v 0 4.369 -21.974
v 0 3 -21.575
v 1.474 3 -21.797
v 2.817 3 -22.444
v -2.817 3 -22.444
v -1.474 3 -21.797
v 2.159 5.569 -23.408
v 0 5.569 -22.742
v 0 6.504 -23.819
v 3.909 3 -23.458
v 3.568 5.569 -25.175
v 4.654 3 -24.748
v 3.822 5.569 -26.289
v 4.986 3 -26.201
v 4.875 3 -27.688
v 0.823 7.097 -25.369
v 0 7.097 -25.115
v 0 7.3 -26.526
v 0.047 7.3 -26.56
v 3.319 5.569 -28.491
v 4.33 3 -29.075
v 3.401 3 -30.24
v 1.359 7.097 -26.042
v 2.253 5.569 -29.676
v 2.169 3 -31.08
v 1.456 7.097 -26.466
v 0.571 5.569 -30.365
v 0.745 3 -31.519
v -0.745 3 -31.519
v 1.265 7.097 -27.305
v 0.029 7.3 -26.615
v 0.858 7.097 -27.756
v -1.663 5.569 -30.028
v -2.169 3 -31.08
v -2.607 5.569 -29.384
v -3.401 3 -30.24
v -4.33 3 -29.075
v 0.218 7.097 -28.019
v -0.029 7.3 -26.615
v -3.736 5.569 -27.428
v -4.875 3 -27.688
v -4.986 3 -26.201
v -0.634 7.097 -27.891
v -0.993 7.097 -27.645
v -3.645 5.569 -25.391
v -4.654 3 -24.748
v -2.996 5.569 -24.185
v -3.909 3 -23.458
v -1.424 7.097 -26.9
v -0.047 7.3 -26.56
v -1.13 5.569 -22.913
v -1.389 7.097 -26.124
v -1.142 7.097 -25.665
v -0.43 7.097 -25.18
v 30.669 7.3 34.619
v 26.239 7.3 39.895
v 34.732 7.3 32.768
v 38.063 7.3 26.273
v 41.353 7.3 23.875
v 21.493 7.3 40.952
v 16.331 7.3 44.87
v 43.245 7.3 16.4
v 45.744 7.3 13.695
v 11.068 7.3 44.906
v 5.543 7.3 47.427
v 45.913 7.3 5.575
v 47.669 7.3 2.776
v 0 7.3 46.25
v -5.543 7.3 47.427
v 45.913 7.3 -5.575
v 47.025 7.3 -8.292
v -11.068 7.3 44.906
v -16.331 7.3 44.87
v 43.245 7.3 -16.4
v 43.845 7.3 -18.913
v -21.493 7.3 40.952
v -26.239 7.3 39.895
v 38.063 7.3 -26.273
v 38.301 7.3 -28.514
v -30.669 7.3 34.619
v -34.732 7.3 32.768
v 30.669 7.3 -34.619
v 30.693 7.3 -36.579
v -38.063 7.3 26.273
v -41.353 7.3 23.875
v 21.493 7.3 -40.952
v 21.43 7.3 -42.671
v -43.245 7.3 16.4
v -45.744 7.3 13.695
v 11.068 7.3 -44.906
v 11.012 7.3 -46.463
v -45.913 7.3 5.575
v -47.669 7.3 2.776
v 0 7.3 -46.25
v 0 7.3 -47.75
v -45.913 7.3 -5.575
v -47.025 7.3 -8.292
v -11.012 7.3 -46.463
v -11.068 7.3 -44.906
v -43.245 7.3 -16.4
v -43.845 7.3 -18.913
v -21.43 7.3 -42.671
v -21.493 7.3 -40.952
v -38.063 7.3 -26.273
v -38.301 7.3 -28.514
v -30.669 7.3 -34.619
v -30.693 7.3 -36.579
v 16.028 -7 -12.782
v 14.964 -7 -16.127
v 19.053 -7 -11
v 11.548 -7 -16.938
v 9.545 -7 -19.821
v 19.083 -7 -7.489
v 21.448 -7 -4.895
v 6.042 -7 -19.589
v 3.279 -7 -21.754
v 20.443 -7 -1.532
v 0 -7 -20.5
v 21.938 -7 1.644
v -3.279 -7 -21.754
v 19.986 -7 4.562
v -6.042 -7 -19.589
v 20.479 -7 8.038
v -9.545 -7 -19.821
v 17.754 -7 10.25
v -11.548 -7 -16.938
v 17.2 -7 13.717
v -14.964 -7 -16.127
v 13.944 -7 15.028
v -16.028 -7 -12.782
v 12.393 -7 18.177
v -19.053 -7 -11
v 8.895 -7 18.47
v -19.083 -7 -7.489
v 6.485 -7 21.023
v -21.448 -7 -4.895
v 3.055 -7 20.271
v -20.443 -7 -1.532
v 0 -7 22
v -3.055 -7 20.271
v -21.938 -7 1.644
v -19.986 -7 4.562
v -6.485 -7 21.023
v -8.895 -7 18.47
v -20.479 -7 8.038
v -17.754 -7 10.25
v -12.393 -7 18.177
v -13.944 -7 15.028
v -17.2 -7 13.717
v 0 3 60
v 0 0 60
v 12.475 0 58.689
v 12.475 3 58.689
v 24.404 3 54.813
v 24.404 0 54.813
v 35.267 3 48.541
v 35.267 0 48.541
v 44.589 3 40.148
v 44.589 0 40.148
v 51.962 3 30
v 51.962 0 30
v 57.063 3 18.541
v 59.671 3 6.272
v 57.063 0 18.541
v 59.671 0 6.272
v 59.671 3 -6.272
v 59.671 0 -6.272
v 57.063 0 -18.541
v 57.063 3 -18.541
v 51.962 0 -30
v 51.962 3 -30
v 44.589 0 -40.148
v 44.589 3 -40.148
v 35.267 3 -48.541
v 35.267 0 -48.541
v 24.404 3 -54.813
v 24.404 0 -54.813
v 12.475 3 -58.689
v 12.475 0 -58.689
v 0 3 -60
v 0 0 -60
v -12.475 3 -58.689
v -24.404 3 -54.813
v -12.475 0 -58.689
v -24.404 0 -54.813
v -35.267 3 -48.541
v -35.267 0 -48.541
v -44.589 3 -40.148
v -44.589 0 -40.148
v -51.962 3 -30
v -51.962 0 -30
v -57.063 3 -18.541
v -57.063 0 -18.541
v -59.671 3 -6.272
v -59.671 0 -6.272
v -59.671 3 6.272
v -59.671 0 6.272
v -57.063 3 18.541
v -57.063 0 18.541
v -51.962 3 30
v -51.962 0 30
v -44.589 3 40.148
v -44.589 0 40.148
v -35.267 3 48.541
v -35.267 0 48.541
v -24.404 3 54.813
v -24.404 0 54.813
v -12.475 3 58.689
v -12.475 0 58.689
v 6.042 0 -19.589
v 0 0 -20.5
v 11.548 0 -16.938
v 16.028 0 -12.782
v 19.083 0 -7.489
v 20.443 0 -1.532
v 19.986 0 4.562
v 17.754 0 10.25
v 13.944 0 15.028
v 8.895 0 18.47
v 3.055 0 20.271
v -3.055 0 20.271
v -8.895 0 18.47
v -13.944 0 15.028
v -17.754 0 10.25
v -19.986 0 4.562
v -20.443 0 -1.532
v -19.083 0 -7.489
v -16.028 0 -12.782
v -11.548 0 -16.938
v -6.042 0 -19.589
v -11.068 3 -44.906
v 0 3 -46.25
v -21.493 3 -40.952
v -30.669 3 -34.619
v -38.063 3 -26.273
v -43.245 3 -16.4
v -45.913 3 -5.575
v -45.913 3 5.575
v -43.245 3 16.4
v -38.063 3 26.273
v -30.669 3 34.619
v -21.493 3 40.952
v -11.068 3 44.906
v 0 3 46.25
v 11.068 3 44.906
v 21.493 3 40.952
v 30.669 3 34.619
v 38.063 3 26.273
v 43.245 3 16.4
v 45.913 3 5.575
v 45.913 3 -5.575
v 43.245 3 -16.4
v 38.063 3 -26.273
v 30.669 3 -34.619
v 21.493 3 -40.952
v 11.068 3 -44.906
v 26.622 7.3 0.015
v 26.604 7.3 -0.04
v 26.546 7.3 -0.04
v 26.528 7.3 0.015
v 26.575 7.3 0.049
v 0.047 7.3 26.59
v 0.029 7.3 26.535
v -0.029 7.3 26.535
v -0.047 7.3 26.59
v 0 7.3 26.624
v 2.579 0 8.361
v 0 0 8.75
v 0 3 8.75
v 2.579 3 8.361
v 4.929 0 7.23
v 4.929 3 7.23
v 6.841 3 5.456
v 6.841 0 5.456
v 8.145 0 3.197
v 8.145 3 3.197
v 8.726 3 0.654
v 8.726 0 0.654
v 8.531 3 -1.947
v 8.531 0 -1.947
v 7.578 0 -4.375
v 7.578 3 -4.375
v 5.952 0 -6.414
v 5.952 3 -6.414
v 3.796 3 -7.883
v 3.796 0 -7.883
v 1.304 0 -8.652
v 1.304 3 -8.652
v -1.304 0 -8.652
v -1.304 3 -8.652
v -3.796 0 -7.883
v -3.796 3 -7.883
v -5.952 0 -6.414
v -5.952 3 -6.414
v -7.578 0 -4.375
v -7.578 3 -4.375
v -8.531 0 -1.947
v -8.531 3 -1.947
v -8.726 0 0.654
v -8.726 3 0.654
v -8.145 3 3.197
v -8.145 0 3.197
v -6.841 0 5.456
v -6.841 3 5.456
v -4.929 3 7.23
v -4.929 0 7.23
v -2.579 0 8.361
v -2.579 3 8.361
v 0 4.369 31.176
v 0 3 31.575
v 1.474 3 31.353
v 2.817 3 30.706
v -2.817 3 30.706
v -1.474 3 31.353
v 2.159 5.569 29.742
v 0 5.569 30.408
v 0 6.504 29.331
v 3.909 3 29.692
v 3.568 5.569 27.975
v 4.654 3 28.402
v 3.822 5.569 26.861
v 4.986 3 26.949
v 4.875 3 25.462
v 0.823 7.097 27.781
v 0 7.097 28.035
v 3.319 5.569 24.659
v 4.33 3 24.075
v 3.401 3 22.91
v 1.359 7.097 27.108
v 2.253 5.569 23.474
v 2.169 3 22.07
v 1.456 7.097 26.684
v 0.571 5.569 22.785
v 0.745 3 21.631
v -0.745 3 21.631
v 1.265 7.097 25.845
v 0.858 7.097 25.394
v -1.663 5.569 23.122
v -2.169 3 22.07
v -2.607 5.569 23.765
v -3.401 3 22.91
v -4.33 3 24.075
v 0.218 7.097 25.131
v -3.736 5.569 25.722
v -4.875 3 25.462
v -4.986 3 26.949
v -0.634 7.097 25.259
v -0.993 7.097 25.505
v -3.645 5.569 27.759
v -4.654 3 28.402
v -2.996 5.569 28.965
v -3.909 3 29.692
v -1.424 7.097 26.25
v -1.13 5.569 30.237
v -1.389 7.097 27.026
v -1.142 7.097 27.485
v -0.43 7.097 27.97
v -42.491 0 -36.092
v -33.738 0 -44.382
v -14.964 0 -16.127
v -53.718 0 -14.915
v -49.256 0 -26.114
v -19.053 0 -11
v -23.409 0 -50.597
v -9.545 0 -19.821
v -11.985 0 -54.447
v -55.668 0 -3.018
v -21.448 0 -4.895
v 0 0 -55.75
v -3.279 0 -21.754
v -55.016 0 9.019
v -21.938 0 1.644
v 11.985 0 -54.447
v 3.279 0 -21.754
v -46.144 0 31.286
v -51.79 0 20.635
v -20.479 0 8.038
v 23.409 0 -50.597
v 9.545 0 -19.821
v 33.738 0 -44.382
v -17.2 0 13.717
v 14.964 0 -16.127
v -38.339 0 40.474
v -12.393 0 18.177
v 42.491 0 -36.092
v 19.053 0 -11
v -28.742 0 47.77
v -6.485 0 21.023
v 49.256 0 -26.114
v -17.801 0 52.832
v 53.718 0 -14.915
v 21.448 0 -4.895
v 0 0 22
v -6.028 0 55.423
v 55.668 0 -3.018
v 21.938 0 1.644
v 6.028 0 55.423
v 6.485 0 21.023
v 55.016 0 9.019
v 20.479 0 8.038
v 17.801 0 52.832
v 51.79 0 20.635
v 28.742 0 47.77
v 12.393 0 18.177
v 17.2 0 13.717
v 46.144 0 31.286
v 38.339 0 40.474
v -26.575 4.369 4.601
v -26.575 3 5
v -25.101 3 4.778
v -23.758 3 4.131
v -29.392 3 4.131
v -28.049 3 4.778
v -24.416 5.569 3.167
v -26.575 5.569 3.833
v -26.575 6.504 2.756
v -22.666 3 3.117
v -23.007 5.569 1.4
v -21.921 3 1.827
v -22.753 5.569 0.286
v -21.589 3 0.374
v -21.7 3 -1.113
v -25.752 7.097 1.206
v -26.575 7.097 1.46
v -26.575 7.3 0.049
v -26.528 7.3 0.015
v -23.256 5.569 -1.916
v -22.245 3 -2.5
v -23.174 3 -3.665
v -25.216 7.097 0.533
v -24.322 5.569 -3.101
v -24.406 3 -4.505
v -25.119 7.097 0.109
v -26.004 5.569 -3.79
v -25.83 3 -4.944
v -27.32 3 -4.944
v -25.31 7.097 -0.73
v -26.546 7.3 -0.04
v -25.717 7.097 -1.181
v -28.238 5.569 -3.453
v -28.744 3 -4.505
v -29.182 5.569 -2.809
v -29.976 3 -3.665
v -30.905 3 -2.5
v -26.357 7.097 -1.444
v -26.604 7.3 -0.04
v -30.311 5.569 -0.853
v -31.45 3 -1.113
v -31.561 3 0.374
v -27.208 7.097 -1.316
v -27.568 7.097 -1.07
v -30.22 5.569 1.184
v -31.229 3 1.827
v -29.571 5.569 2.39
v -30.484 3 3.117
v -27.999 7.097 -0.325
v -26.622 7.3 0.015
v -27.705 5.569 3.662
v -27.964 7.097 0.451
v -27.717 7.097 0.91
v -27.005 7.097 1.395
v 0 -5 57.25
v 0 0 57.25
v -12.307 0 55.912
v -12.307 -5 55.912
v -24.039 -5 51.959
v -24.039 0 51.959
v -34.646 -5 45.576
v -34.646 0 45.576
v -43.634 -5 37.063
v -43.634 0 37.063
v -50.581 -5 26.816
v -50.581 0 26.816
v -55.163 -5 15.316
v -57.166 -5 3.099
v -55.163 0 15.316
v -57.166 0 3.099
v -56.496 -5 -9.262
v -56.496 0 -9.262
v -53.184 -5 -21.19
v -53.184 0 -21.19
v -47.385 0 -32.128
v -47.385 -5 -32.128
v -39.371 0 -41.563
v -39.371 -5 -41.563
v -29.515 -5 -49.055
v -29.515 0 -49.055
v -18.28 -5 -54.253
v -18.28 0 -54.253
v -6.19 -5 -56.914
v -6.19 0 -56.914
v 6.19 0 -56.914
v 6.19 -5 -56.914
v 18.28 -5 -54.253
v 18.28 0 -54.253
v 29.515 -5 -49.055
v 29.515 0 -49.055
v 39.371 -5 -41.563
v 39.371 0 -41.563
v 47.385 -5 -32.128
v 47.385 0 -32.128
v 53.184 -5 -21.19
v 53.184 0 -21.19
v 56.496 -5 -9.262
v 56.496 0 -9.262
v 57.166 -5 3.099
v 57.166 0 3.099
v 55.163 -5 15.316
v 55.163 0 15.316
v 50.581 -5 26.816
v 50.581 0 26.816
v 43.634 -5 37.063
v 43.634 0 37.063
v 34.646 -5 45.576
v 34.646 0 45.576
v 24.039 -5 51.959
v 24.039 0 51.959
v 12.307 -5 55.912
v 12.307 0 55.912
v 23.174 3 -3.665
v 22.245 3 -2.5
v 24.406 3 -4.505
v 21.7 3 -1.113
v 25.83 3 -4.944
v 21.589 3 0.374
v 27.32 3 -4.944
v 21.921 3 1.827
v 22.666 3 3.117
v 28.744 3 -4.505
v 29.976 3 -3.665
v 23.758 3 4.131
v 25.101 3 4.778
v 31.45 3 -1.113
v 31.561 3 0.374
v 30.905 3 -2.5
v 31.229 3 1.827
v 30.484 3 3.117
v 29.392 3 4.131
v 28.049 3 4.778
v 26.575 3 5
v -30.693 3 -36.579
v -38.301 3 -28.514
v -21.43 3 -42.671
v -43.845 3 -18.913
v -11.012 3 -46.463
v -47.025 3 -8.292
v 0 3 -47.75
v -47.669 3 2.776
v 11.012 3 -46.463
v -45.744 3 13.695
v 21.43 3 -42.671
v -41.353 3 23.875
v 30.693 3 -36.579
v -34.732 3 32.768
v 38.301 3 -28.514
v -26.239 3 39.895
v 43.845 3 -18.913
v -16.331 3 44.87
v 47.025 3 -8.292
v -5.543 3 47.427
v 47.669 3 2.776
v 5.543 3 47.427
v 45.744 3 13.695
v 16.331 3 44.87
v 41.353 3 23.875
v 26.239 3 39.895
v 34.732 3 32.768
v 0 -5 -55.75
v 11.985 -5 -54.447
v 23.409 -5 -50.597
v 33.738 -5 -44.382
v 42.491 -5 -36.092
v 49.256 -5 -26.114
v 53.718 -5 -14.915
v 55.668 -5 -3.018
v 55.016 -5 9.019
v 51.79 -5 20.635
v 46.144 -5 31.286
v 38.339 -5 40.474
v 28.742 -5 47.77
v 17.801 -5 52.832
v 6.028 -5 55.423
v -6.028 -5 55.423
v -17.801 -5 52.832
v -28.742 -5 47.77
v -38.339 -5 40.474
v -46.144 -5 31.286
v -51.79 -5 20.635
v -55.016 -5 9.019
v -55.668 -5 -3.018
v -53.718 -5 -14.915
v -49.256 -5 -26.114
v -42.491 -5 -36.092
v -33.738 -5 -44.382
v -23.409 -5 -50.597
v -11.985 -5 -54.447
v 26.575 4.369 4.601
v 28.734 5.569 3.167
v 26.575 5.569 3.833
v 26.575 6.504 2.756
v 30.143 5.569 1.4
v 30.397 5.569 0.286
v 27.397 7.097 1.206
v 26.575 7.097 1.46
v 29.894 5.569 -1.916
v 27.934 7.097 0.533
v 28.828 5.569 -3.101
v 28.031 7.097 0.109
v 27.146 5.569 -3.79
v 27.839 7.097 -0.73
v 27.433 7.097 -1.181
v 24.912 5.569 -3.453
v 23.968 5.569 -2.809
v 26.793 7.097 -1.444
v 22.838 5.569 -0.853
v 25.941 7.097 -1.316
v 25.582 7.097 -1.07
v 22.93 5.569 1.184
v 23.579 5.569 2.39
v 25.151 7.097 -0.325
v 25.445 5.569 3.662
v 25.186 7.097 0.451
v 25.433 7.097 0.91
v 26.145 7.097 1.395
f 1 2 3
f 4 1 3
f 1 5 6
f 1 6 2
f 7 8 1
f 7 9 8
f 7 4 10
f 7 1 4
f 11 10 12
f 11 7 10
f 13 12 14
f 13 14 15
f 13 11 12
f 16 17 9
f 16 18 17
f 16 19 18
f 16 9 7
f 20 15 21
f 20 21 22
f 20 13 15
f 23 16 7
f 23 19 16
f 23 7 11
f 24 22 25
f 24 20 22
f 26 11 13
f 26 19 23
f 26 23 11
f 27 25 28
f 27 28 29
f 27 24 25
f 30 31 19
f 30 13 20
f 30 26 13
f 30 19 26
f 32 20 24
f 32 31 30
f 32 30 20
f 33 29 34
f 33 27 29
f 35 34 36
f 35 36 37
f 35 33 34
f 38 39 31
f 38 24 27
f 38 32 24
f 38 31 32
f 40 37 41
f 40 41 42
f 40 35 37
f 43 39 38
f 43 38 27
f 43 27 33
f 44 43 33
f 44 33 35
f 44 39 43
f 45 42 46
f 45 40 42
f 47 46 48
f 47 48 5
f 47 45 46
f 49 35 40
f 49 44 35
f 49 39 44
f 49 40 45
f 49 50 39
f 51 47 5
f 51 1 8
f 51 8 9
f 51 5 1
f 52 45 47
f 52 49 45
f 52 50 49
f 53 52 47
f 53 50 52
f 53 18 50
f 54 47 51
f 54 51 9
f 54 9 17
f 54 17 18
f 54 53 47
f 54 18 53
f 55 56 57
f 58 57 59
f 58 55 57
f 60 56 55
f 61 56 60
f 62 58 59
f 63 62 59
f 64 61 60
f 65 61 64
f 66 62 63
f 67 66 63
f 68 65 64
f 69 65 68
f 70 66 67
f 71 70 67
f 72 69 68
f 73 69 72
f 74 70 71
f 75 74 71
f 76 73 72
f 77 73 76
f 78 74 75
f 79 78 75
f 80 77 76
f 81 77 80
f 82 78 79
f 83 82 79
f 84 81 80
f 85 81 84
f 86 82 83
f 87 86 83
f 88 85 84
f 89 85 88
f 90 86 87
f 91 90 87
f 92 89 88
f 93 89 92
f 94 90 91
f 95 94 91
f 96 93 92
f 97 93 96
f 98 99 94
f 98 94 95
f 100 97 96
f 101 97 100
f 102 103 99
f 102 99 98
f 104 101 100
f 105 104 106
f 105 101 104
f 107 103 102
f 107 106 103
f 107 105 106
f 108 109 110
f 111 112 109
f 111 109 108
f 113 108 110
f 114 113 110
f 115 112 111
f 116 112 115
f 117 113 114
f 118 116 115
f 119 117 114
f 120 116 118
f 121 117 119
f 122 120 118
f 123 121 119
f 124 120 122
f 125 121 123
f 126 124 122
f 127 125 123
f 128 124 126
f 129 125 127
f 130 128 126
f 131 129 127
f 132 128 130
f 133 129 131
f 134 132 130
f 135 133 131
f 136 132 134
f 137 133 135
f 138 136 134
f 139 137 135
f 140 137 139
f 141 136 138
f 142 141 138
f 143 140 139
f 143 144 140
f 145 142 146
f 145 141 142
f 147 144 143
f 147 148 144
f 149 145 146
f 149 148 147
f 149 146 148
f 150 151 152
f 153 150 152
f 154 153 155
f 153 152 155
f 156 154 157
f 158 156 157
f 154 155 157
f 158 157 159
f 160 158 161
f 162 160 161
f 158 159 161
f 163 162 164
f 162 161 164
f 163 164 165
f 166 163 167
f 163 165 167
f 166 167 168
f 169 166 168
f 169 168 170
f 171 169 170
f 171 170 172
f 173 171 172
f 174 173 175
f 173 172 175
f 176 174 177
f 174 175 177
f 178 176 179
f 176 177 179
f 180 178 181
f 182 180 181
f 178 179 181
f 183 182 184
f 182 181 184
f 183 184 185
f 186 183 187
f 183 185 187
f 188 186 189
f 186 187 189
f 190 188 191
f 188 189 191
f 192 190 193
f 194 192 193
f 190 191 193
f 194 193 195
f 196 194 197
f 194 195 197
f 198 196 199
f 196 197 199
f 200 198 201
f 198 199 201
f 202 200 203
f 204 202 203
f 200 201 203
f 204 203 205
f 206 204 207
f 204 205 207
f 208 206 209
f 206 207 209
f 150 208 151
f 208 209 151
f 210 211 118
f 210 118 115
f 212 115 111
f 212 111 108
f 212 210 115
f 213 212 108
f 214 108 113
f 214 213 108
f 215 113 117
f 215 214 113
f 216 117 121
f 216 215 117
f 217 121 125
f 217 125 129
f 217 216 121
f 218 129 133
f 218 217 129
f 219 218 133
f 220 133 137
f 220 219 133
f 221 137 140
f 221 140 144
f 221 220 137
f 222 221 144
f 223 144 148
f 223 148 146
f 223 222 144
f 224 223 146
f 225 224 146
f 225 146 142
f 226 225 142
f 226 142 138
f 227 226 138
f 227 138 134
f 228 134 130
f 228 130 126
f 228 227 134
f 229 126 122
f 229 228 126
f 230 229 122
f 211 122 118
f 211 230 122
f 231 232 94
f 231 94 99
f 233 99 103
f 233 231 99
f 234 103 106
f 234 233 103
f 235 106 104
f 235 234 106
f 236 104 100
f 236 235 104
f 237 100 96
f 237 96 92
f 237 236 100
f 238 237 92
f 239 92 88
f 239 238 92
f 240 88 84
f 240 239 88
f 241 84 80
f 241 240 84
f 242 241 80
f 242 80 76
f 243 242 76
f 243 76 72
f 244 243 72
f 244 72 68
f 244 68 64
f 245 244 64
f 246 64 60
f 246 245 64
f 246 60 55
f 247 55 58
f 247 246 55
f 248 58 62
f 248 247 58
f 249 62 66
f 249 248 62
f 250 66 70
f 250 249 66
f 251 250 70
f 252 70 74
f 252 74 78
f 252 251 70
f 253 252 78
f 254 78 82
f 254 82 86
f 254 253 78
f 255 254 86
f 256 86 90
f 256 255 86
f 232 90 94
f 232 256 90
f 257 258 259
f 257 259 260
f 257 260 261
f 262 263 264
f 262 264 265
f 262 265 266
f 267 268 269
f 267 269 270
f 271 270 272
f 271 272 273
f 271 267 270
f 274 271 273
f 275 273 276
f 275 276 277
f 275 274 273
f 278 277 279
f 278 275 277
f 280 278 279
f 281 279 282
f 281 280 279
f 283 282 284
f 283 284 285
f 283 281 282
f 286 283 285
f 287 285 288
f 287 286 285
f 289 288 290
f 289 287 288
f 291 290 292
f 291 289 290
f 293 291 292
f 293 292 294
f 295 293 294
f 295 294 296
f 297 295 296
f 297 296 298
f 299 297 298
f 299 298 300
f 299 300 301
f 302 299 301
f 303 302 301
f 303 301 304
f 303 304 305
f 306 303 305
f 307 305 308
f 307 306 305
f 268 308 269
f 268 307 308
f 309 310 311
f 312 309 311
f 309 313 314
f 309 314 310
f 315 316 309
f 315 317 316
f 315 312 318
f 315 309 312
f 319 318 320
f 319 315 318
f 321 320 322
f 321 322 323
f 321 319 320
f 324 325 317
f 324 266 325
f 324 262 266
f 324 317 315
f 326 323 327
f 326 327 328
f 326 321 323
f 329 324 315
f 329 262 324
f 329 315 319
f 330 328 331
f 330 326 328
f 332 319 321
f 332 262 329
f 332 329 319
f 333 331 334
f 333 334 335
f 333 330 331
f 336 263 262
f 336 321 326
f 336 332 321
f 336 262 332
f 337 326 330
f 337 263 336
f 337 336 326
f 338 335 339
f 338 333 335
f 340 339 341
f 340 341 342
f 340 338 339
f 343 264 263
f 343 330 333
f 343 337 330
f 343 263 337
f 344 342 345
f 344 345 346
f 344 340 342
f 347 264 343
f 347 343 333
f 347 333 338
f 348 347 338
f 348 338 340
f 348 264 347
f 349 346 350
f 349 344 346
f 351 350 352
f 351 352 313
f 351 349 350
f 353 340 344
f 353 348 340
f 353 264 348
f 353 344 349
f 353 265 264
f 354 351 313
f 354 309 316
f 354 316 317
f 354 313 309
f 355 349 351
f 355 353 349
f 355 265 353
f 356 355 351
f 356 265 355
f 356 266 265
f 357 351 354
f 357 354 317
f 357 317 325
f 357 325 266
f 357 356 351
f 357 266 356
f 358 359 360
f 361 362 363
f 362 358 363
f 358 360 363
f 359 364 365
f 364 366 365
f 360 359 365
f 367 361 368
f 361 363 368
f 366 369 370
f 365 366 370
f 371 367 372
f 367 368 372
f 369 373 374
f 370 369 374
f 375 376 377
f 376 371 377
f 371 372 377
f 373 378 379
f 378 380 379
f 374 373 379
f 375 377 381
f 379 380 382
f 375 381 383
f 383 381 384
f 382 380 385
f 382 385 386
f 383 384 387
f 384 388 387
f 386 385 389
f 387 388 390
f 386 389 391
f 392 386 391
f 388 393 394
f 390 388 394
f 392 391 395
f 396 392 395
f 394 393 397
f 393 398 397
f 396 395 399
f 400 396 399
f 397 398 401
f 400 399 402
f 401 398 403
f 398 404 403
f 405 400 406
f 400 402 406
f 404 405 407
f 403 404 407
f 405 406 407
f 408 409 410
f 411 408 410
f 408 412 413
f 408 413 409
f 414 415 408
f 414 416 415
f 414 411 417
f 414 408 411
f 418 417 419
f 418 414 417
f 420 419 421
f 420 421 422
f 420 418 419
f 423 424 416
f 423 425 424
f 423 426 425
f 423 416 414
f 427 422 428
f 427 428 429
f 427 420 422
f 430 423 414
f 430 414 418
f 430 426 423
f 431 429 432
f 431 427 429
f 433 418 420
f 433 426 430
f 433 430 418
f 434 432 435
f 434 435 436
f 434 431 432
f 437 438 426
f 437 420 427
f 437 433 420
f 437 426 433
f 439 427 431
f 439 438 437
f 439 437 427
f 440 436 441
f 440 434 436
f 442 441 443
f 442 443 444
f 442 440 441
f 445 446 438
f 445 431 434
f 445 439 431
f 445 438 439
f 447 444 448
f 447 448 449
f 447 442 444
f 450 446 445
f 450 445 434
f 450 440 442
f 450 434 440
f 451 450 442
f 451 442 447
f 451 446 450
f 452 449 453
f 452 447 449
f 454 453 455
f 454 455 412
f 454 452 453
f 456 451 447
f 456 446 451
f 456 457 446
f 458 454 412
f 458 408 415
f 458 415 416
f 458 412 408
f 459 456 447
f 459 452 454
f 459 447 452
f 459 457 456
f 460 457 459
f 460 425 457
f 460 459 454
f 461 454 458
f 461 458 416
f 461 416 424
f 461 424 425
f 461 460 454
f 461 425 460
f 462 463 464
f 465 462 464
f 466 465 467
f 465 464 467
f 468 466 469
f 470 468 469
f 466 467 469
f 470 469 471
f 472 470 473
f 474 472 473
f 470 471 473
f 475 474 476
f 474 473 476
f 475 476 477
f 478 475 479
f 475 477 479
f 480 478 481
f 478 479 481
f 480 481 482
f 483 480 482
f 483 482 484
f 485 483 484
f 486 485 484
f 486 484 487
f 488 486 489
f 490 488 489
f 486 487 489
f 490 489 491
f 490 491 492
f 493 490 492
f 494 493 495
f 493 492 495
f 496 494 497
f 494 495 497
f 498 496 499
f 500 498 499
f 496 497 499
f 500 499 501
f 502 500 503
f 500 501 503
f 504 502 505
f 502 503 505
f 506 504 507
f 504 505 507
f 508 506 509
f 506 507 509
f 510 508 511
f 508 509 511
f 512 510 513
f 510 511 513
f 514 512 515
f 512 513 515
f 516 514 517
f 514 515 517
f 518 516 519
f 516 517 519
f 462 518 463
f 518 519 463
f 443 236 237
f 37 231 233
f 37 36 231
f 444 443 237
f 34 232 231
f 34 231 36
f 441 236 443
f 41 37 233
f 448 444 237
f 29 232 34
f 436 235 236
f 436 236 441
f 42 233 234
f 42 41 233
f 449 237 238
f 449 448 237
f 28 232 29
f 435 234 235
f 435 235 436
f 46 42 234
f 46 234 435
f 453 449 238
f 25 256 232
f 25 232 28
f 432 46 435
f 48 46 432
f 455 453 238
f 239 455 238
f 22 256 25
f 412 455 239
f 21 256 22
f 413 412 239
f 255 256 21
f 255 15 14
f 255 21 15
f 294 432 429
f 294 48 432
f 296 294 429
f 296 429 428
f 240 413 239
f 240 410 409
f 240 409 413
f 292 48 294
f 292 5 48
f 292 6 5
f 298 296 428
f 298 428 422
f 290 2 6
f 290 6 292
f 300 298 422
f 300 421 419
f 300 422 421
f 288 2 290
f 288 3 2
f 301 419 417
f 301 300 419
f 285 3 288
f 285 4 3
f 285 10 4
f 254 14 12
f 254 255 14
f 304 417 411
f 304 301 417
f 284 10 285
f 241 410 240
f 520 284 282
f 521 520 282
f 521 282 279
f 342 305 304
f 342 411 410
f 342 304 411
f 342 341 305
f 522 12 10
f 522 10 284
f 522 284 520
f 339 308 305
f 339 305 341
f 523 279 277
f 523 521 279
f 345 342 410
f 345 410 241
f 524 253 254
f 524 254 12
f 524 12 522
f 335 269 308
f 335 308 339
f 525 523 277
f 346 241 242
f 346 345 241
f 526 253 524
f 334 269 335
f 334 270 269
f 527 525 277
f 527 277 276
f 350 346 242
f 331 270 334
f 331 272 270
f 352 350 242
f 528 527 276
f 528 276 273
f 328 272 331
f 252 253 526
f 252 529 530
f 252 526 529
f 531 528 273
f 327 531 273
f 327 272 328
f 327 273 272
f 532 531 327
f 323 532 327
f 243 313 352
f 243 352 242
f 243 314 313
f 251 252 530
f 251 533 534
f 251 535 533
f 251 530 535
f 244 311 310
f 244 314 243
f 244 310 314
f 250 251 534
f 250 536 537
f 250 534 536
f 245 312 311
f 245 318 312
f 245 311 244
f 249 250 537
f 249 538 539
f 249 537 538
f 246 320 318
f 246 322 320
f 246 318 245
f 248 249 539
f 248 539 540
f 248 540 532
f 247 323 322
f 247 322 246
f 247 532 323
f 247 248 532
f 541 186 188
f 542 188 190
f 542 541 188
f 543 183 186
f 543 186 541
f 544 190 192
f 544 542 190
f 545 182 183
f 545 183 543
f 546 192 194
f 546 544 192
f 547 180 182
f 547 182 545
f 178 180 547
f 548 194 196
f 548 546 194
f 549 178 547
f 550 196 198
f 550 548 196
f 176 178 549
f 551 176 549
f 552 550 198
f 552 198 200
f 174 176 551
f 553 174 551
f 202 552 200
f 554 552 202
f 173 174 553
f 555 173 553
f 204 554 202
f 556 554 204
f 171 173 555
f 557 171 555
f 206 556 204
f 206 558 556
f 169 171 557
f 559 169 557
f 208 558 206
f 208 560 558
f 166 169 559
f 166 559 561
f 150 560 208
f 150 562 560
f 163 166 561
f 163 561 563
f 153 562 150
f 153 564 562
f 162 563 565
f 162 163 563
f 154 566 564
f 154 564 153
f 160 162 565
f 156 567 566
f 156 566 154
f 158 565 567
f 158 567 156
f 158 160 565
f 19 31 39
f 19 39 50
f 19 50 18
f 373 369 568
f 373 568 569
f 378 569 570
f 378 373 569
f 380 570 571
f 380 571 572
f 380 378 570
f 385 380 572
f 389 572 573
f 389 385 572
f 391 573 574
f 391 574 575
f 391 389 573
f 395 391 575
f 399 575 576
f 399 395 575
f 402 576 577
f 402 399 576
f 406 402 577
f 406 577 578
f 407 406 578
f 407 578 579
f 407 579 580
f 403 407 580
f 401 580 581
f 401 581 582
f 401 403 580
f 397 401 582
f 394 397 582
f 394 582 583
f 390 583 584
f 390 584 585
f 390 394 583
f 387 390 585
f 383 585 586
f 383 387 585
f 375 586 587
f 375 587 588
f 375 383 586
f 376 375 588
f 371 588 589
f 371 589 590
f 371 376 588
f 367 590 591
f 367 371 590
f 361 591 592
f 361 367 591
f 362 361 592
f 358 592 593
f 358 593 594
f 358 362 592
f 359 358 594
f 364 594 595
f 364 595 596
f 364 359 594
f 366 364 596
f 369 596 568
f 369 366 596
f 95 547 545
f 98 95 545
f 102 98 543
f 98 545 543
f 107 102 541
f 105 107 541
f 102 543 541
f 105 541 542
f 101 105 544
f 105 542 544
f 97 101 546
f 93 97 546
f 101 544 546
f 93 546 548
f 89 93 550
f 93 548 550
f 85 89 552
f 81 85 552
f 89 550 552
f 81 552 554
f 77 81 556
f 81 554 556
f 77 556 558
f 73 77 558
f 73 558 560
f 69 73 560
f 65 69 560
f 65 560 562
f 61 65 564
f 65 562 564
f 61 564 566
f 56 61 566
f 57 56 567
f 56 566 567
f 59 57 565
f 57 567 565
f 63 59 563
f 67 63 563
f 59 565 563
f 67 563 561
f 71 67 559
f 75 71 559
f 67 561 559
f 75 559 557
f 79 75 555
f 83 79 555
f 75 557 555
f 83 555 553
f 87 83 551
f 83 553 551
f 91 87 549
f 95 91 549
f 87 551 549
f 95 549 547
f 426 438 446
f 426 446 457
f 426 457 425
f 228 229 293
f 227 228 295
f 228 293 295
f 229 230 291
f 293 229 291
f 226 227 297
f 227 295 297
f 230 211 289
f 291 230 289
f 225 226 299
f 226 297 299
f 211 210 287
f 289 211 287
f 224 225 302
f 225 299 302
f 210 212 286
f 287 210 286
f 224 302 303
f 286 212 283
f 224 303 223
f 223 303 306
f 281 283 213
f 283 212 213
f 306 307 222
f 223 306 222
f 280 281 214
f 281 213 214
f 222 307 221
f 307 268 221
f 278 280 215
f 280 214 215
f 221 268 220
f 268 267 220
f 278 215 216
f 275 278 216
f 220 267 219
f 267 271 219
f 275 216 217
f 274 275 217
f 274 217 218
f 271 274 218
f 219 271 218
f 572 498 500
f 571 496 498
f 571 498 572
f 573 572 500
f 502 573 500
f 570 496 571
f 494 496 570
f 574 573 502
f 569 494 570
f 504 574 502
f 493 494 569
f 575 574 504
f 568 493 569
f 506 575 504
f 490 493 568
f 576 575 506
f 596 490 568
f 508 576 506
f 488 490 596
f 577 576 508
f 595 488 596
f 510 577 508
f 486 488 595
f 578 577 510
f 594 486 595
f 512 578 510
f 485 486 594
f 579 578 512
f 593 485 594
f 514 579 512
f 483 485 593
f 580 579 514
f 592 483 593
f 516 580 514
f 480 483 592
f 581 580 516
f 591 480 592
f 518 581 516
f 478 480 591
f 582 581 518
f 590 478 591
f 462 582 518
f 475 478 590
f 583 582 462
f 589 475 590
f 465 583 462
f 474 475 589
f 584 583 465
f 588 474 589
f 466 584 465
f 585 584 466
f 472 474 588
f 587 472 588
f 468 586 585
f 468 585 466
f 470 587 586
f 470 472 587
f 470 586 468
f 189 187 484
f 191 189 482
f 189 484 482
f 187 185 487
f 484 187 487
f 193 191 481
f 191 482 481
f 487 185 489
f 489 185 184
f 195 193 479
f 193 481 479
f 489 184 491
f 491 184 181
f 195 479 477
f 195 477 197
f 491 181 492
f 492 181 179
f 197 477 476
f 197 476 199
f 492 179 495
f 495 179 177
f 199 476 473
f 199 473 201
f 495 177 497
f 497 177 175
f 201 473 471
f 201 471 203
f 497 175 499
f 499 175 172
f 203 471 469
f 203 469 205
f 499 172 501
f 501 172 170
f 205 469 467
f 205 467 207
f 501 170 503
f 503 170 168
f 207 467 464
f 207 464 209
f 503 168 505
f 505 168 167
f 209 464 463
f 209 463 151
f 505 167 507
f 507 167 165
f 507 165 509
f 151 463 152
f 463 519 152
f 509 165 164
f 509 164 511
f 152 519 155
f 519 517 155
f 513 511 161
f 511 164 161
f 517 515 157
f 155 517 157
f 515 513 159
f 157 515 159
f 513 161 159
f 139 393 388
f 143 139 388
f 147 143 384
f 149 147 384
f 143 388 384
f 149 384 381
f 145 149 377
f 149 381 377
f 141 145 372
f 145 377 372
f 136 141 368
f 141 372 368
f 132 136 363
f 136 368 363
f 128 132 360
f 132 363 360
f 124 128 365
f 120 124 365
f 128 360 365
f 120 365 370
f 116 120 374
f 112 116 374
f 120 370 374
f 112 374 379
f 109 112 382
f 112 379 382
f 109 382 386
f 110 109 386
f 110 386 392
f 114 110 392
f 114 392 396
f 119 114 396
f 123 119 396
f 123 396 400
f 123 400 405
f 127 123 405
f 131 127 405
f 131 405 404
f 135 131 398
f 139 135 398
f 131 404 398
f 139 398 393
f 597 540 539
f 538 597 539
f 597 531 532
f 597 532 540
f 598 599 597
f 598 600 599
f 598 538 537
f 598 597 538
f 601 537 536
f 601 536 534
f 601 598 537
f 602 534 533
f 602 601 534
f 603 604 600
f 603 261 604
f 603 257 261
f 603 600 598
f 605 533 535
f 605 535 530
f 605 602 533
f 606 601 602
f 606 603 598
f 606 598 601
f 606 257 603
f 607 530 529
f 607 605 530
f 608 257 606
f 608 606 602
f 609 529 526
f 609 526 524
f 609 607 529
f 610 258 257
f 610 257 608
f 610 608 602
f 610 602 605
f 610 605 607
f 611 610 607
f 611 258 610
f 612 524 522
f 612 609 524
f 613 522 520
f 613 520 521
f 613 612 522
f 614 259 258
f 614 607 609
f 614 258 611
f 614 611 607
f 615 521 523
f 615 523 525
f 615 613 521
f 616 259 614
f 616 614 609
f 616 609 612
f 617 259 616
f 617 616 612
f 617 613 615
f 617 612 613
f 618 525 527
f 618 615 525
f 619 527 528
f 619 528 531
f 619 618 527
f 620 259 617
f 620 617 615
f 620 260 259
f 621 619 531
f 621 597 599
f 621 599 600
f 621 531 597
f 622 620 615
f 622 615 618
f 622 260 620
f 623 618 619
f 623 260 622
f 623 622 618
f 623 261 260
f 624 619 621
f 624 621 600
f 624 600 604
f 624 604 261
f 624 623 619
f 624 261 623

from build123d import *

# Parameters (mm, degrees)
SKETCH3_R           = 60
SKETCH3_R_2         = 8.75
BOSS_EXTRUDE1_DEPTH = 3
SKETCH4_R           = 57.25
SKETCH4_R_2         = 55.75
BOSS_EXTRUDE2_DEPTH = 5
SKETCH5_R           = 22
SKETCH5_R_2         = 20.5
BOSS_EXTRUDE3_DEPTH = 7
SKETCH6_R           = 47.75
SKETCH6_R_2         = 46.25
BOSS_EXTRUDE4_DEPTH = 4.3
SKETCH10_R          = 5
BOSS_EXTRUDE5_DEPTH = 4.3
FILLET2_R           = 5


with BuildPart() as part:
    # Sketch3 → Boss-Extrude1 (new body)
    with BuildSketch(Plane(origin=(0, 0, 0), x_dir=(1, 0, 0), z_dir=(0, 1, 0))):
        with Locations(Location((0, 0, 0), (0, 0, 270))):
            Circle(SKETCH3_R)
        with Locations(Location((0, 0, 0), (0, 0, 270))):
            Circle(SKETCH3_R_2, mode=Mode.SUBTRACT)
    extrude(amount=BOSS_EXTRUDE1_DEPTH)

    # Sketch4 → Boss-Extrude2 (add)
    with BuildSketch(Plane.XZ):
        with Locations(Location((0, 0, 0), (0, 0, 90))):
            Circle(SKETCH4_R)
        with Locations(Location((0, 0, 0), (0, 0, 270))):
            Circle(SKETCH4_R_2, mode=Mode.SUBTRACT)
    extrude(amount=BOSS_EXTRUDE2_DEPTH)

    # Sketch5 → Boss-Extrude3 (add)
    with BuildSketch(Plane.XZ):
        with Locations(Location((0, 0, 0), (0, 0, 90))):
            Circle(SKETCH5_R)
        with Locations(Location((0, 0, 0), (0, 0, 270))):
            Circle(SKETCH5_R_2, mode=Mode.SUBTRACT)
    extrude(amount=BOSS_EXTRUDE3_DEPTH)

    # Sketch6 → Boss-Extrude4 (add)
    with BuildSketch(Plane(origin=(0, 3, 0), x_dir=(1, 0, 0), z_dir=(0, 1, 0))):
        with Locations(Location((0, 0, 0), (0, 0, 90))):
            Circle(SKETCH6_R)
        with Locations(Location((0, 0, 0), (0, 0, 90))):
            Circle(SKETCH6_R_2, mode=Mode.SUBTRACT)
    extrude(amount=BOSS_EXTRUDE4_DEPTH)

    # Sketch10 → Boss-Extrude5 (add)
    with BuildSketch(Plane(origin=(0, 3, 0), x_dir=(1, 0, 0), z_dir=(0, 1, 0))):
        with Locations(Location((0, 26.574961269, 0), (0, 0, 270))):
            Circle(SKETCH10_R)
        with Locations(Location((26.574961269, 0, 0), (0, 0, 270))):
            Circle(SKETCH10_R)
        with Locations(Location((0, -26.574961269, 0), (0, 0, 270))):
            Circle(SKETCH10_R)
        with Locations(Location((-26.574961269, 0, 0), (0, 0, 270))):
            Circle(SKETCH10_R)
    extrude(amount=BOSS_EXTRUDE5_DEPTH)

    # Fillet2
    # the kernel refuses this fillet: 5 mm, written as the material it takes off along each edge
    with BuildSketch(Plane(origin=(0, 7.3, -26.574961269), x_dir=(0, 0, 1), z_dir=(-1, 0, 0))) as fillet2_piece_1:
        with BuildLine():
            CenterArc((0.049242482, -5), FILLET2_R, 8.047846247, 81.952153753)
            Line((0.049242482, 0), (0.049242482, 0.1))
            Line((0.049242482, 0.1), (5, 0.1))
            Line((5, 0.1), (5.1, 0))
            ThreePointArc((5.1, 0), (5.1, -2.15), (5.09901515, -4.286))
            Line((5.09901515, -4.286), (5, -4.3))
        make_face()
    revolve(axis=Axis((0, 7.3, -26.574961269), (0, 1, 0)), mode=Mode.SUBTRACT)
    with BuildSketch(Plane(origin=(26.574961269, 7.3, 0), x_dir=(0, 0, 1), z_dir=(-1, 0, 0))) as fillet2_piece_2:
        with BuildLine():
            CenterArc((0.049242482, -5), FILLET2_R, 8.047846247, 81.952153753)
            Line((0.049242482, 0), (0.049242482, 0.1))
            Line((0.049242482, 0.1), (5, 0.1))
            Line((5, 0.1), (5.1, 0))
            ThreePointArc((5.1, 0), (5.1, -2.15), (5.09901515, -4.286))
            Line((5.09901515, -4.286), (5, -4.3))
        make_face()
    revolve(axis=Axis((26.574961269, 7.3, 0), (0, 1, 0)), mode=Mode.SUBTRACT)
    with BuildSketch(Plane(origin=(0, 7.3, 26.574961269), x_dir=(0, 0, 1), z_dir=(-1, 0, 0))) as fillet2_piece_3:
        with BuildLine():
            CenterArc((0.049242482, -5), FILLET2_R, 8.047846247, 81.952153753)
            Line((0.049242482, 0), (0.049242482, 0.1))
            Line((0.049242482, 0.1), (5, 0.1))
            Line((5, 0.1), (5.1, 0))
            ThreePointArc((5.1, 0), (5.1, -2.15), (5.09901515, -4.286))
            Line((5.09901515, -4.286), (5, -4.3))
        make_face()
    revolve(axis=Axis((0, 7.3, 26.574961269), (0, 1, 0)), mode=Mode.SUBTRACT)
    with BuildSketch(Plane(origin=(-26.574961269, 7.3, 0), x_dir=(0, 0, 1), z_dir=(-1, 0, 0))) as fillet2_piece_4:
        with BuildLine():
            CenterArc((0.049242482, -5), FILLET2_R, 8.047846247, 81.952153753)
            Line((0.049242482, 0), (0.049242482, 0.1))
            Line((0.049242482, 0.1), (5, 0.1))
            Line((5, 0.1), (5.1, 0))
            ThreePointArc((5.1, 0), (5.1, -2.15), (5.09901515, -4.286))
            Line((5.09901515, -4.286), (5, -4.3))
        make_face()
    revolve(axis=Axis((-26.574961269, 7.3, 0), (0, 1, 0)), mode=Mode.SUBTRACT)


solid = part.part
